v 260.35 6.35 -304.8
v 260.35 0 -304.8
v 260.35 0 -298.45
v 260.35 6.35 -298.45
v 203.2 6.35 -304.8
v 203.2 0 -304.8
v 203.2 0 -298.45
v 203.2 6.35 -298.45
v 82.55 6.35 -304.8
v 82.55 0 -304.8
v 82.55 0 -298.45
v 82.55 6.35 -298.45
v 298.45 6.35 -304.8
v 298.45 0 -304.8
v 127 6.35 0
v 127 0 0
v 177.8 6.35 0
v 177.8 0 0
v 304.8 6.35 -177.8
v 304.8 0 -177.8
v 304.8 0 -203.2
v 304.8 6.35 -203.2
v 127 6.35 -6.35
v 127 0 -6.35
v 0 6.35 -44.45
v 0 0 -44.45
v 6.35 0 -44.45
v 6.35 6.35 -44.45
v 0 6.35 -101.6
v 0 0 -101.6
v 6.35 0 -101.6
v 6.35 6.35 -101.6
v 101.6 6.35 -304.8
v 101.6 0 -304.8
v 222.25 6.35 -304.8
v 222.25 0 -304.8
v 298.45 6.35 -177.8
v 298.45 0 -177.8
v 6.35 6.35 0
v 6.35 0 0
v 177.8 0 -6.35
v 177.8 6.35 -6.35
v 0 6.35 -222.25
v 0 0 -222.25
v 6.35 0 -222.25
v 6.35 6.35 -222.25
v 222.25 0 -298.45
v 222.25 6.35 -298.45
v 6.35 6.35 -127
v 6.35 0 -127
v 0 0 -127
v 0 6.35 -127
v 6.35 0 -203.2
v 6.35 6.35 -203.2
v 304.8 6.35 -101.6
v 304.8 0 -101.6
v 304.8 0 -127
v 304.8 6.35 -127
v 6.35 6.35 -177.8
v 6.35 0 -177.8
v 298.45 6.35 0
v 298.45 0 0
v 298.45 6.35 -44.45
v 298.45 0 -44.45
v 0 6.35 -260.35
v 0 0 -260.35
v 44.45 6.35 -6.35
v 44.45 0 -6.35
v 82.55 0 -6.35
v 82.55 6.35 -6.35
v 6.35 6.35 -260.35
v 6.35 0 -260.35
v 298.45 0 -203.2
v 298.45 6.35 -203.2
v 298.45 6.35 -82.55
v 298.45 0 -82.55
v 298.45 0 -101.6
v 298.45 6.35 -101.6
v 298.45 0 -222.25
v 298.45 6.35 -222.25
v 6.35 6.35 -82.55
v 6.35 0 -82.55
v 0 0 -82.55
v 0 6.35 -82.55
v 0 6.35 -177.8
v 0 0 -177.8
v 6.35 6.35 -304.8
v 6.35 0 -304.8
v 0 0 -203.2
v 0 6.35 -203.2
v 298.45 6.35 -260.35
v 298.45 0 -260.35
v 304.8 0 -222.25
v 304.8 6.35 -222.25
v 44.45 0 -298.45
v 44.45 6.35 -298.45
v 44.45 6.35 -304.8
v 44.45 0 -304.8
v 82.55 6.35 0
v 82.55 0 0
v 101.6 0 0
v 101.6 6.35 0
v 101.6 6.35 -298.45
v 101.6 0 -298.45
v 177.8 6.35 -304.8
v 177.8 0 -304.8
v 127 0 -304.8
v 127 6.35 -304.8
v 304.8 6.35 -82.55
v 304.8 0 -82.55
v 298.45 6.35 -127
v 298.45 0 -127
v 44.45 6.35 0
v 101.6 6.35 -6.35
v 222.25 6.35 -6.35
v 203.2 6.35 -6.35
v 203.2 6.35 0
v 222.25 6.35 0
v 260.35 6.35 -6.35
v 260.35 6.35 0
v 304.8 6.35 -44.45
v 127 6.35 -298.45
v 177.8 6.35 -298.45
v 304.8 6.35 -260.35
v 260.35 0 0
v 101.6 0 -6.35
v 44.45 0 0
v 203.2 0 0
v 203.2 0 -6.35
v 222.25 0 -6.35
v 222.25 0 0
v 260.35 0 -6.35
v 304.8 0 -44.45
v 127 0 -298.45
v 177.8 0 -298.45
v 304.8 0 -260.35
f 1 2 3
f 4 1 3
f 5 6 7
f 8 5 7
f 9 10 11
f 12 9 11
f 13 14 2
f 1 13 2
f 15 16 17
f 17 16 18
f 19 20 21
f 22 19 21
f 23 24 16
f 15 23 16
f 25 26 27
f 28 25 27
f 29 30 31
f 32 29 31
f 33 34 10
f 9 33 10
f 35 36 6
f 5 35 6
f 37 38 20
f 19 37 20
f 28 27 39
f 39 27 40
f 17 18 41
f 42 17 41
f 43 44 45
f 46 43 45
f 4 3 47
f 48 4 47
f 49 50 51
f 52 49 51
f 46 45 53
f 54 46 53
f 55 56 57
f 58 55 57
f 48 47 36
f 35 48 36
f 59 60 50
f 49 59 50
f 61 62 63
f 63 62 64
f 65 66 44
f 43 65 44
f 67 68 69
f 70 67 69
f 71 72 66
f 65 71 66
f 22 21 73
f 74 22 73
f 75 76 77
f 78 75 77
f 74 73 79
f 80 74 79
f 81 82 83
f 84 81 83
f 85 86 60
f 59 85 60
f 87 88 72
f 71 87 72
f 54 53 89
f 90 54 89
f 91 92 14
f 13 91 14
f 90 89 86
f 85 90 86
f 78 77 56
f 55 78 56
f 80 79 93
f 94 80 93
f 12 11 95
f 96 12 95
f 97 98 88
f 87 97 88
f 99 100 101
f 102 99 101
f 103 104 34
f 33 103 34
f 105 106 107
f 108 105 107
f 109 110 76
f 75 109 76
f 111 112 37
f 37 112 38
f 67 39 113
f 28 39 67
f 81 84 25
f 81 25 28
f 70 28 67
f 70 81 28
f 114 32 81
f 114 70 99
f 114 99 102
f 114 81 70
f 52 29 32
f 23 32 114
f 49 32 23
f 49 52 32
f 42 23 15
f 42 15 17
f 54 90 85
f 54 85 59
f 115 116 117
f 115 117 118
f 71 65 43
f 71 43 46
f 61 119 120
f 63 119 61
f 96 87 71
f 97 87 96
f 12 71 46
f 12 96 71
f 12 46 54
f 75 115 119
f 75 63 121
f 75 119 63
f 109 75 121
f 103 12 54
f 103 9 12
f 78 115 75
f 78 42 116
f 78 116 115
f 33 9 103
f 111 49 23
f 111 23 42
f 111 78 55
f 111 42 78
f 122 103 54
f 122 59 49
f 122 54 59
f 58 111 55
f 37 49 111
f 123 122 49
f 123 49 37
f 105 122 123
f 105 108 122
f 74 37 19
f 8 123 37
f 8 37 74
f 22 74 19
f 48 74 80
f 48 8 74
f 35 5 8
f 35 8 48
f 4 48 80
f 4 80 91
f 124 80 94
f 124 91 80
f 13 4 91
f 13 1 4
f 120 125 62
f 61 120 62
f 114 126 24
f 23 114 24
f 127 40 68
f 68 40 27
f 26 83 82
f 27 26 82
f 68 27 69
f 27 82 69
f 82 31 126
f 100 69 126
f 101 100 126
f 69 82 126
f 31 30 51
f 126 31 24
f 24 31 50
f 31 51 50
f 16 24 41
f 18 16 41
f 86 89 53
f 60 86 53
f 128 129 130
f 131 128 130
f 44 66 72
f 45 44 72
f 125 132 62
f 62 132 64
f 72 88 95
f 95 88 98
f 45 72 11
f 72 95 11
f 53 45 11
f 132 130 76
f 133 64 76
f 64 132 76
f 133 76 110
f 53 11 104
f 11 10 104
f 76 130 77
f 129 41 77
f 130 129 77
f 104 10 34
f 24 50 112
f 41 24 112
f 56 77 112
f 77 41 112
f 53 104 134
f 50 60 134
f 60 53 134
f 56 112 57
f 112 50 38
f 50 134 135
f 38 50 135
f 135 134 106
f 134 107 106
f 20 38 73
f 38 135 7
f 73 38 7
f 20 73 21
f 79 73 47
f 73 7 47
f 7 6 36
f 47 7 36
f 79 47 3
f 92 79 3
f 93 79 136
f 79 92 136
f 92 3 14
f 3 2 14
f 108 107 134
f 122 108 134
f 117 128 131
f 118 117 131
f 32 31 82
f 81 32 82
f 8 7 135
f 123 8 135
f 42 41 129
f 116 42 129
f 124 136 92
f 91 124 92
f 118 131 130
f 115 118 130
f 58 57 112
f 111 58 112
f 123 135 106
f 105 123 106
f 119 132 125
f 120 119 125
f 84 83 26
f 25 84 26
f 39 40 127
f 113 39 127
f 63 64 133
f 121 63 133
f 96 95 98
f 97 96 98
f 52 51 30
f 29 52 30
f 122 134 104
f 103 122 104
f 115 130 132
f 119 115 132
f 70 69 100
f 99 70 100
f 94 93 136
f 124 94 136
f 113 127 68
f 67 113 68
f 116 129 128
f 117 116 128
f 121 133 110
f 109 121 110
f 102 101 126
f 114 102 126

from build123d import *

# Parameters (mm, degrees)
BOSS_EXTRUDE1_DEPTH = 6.35


with BuildPart() as part:
    # Sketch1 → Boss-Extrude1 (new body)
    with BuildSketch(Plane(origin=(0, 0, 0), x_dir=(1, 0, 0), z_dir=(0, 1, 0))):
        Polygon((152.4, 152.4), (6.35, 152.4), (6.35, 127), (0, 127), (0, 101.6), (6.35, 101.6), (6.35, 82.55), (0, 82.55), (0, 44.45), (6.35, 44.45), (6.35, 0), (44.45, 0), (44.45, 6.35), (82.55, 6.35), (82.55, 0), (101.6, 0), (101.6, 6.35), (127, 6.35), (127, 0), (152.4, 0), align=None)
        Polygon((6.35, 177.8), (6.35, 152.4), (152.4, 152.4), (152.4, 304.8), (127, 304.8), (127, 298.45), (101.6, 298.45), (101.6, 304.8), (82.55, 304.8), (82.55, 298.45), (44.45, 298.45), (44.45, 304.8), (6.35, 304.8), (6.35, 260.35), (0, 260.35), (0, 222.25), (6.35, 222.25), (6.35, 203.2), (0, 203.2), (0, 177.8), align=None)
        Polygon((152.4, 304.8), (152.4, 152.4), (298.45, 152.4), (298.45, 177.8), (304.8, 177.8), (304.8, 203.2), (298.45, 203.2), (298.45, 222.25), (304.8, 222.25), (304.8, 260.35), (298.45, 260.35), (298.45, 304.8), (260.35, 304.8), (260.35, 298.45), (222.25, 298.45), (222.25, 304.8), (203.2, 304.8), (203.2, 298.45), (177.8, 298.45), (177.8, 304.8), align=None)
        Polygon((298.45, 152.4), (152.4, 152.4), (152.4, 0), (177.8, 0), (177.8, 6.35), (203.2, 6.35), (203.2, 0), (222.25, 0), (222.25, 6.35), (260.35, 6.35), (260.35, 0), (298.45, 0), (298.45, 44.45), (304.8, 44.45), (304.8, 82.55), (298.45, 82.55), (298.45, 101.6), (304.8, 101.6), (304.8, 127), (298.45, 127), align=None)
    extrude(amount=BOSS_EXTRUDE1_DEPTH)


solid = part.part
